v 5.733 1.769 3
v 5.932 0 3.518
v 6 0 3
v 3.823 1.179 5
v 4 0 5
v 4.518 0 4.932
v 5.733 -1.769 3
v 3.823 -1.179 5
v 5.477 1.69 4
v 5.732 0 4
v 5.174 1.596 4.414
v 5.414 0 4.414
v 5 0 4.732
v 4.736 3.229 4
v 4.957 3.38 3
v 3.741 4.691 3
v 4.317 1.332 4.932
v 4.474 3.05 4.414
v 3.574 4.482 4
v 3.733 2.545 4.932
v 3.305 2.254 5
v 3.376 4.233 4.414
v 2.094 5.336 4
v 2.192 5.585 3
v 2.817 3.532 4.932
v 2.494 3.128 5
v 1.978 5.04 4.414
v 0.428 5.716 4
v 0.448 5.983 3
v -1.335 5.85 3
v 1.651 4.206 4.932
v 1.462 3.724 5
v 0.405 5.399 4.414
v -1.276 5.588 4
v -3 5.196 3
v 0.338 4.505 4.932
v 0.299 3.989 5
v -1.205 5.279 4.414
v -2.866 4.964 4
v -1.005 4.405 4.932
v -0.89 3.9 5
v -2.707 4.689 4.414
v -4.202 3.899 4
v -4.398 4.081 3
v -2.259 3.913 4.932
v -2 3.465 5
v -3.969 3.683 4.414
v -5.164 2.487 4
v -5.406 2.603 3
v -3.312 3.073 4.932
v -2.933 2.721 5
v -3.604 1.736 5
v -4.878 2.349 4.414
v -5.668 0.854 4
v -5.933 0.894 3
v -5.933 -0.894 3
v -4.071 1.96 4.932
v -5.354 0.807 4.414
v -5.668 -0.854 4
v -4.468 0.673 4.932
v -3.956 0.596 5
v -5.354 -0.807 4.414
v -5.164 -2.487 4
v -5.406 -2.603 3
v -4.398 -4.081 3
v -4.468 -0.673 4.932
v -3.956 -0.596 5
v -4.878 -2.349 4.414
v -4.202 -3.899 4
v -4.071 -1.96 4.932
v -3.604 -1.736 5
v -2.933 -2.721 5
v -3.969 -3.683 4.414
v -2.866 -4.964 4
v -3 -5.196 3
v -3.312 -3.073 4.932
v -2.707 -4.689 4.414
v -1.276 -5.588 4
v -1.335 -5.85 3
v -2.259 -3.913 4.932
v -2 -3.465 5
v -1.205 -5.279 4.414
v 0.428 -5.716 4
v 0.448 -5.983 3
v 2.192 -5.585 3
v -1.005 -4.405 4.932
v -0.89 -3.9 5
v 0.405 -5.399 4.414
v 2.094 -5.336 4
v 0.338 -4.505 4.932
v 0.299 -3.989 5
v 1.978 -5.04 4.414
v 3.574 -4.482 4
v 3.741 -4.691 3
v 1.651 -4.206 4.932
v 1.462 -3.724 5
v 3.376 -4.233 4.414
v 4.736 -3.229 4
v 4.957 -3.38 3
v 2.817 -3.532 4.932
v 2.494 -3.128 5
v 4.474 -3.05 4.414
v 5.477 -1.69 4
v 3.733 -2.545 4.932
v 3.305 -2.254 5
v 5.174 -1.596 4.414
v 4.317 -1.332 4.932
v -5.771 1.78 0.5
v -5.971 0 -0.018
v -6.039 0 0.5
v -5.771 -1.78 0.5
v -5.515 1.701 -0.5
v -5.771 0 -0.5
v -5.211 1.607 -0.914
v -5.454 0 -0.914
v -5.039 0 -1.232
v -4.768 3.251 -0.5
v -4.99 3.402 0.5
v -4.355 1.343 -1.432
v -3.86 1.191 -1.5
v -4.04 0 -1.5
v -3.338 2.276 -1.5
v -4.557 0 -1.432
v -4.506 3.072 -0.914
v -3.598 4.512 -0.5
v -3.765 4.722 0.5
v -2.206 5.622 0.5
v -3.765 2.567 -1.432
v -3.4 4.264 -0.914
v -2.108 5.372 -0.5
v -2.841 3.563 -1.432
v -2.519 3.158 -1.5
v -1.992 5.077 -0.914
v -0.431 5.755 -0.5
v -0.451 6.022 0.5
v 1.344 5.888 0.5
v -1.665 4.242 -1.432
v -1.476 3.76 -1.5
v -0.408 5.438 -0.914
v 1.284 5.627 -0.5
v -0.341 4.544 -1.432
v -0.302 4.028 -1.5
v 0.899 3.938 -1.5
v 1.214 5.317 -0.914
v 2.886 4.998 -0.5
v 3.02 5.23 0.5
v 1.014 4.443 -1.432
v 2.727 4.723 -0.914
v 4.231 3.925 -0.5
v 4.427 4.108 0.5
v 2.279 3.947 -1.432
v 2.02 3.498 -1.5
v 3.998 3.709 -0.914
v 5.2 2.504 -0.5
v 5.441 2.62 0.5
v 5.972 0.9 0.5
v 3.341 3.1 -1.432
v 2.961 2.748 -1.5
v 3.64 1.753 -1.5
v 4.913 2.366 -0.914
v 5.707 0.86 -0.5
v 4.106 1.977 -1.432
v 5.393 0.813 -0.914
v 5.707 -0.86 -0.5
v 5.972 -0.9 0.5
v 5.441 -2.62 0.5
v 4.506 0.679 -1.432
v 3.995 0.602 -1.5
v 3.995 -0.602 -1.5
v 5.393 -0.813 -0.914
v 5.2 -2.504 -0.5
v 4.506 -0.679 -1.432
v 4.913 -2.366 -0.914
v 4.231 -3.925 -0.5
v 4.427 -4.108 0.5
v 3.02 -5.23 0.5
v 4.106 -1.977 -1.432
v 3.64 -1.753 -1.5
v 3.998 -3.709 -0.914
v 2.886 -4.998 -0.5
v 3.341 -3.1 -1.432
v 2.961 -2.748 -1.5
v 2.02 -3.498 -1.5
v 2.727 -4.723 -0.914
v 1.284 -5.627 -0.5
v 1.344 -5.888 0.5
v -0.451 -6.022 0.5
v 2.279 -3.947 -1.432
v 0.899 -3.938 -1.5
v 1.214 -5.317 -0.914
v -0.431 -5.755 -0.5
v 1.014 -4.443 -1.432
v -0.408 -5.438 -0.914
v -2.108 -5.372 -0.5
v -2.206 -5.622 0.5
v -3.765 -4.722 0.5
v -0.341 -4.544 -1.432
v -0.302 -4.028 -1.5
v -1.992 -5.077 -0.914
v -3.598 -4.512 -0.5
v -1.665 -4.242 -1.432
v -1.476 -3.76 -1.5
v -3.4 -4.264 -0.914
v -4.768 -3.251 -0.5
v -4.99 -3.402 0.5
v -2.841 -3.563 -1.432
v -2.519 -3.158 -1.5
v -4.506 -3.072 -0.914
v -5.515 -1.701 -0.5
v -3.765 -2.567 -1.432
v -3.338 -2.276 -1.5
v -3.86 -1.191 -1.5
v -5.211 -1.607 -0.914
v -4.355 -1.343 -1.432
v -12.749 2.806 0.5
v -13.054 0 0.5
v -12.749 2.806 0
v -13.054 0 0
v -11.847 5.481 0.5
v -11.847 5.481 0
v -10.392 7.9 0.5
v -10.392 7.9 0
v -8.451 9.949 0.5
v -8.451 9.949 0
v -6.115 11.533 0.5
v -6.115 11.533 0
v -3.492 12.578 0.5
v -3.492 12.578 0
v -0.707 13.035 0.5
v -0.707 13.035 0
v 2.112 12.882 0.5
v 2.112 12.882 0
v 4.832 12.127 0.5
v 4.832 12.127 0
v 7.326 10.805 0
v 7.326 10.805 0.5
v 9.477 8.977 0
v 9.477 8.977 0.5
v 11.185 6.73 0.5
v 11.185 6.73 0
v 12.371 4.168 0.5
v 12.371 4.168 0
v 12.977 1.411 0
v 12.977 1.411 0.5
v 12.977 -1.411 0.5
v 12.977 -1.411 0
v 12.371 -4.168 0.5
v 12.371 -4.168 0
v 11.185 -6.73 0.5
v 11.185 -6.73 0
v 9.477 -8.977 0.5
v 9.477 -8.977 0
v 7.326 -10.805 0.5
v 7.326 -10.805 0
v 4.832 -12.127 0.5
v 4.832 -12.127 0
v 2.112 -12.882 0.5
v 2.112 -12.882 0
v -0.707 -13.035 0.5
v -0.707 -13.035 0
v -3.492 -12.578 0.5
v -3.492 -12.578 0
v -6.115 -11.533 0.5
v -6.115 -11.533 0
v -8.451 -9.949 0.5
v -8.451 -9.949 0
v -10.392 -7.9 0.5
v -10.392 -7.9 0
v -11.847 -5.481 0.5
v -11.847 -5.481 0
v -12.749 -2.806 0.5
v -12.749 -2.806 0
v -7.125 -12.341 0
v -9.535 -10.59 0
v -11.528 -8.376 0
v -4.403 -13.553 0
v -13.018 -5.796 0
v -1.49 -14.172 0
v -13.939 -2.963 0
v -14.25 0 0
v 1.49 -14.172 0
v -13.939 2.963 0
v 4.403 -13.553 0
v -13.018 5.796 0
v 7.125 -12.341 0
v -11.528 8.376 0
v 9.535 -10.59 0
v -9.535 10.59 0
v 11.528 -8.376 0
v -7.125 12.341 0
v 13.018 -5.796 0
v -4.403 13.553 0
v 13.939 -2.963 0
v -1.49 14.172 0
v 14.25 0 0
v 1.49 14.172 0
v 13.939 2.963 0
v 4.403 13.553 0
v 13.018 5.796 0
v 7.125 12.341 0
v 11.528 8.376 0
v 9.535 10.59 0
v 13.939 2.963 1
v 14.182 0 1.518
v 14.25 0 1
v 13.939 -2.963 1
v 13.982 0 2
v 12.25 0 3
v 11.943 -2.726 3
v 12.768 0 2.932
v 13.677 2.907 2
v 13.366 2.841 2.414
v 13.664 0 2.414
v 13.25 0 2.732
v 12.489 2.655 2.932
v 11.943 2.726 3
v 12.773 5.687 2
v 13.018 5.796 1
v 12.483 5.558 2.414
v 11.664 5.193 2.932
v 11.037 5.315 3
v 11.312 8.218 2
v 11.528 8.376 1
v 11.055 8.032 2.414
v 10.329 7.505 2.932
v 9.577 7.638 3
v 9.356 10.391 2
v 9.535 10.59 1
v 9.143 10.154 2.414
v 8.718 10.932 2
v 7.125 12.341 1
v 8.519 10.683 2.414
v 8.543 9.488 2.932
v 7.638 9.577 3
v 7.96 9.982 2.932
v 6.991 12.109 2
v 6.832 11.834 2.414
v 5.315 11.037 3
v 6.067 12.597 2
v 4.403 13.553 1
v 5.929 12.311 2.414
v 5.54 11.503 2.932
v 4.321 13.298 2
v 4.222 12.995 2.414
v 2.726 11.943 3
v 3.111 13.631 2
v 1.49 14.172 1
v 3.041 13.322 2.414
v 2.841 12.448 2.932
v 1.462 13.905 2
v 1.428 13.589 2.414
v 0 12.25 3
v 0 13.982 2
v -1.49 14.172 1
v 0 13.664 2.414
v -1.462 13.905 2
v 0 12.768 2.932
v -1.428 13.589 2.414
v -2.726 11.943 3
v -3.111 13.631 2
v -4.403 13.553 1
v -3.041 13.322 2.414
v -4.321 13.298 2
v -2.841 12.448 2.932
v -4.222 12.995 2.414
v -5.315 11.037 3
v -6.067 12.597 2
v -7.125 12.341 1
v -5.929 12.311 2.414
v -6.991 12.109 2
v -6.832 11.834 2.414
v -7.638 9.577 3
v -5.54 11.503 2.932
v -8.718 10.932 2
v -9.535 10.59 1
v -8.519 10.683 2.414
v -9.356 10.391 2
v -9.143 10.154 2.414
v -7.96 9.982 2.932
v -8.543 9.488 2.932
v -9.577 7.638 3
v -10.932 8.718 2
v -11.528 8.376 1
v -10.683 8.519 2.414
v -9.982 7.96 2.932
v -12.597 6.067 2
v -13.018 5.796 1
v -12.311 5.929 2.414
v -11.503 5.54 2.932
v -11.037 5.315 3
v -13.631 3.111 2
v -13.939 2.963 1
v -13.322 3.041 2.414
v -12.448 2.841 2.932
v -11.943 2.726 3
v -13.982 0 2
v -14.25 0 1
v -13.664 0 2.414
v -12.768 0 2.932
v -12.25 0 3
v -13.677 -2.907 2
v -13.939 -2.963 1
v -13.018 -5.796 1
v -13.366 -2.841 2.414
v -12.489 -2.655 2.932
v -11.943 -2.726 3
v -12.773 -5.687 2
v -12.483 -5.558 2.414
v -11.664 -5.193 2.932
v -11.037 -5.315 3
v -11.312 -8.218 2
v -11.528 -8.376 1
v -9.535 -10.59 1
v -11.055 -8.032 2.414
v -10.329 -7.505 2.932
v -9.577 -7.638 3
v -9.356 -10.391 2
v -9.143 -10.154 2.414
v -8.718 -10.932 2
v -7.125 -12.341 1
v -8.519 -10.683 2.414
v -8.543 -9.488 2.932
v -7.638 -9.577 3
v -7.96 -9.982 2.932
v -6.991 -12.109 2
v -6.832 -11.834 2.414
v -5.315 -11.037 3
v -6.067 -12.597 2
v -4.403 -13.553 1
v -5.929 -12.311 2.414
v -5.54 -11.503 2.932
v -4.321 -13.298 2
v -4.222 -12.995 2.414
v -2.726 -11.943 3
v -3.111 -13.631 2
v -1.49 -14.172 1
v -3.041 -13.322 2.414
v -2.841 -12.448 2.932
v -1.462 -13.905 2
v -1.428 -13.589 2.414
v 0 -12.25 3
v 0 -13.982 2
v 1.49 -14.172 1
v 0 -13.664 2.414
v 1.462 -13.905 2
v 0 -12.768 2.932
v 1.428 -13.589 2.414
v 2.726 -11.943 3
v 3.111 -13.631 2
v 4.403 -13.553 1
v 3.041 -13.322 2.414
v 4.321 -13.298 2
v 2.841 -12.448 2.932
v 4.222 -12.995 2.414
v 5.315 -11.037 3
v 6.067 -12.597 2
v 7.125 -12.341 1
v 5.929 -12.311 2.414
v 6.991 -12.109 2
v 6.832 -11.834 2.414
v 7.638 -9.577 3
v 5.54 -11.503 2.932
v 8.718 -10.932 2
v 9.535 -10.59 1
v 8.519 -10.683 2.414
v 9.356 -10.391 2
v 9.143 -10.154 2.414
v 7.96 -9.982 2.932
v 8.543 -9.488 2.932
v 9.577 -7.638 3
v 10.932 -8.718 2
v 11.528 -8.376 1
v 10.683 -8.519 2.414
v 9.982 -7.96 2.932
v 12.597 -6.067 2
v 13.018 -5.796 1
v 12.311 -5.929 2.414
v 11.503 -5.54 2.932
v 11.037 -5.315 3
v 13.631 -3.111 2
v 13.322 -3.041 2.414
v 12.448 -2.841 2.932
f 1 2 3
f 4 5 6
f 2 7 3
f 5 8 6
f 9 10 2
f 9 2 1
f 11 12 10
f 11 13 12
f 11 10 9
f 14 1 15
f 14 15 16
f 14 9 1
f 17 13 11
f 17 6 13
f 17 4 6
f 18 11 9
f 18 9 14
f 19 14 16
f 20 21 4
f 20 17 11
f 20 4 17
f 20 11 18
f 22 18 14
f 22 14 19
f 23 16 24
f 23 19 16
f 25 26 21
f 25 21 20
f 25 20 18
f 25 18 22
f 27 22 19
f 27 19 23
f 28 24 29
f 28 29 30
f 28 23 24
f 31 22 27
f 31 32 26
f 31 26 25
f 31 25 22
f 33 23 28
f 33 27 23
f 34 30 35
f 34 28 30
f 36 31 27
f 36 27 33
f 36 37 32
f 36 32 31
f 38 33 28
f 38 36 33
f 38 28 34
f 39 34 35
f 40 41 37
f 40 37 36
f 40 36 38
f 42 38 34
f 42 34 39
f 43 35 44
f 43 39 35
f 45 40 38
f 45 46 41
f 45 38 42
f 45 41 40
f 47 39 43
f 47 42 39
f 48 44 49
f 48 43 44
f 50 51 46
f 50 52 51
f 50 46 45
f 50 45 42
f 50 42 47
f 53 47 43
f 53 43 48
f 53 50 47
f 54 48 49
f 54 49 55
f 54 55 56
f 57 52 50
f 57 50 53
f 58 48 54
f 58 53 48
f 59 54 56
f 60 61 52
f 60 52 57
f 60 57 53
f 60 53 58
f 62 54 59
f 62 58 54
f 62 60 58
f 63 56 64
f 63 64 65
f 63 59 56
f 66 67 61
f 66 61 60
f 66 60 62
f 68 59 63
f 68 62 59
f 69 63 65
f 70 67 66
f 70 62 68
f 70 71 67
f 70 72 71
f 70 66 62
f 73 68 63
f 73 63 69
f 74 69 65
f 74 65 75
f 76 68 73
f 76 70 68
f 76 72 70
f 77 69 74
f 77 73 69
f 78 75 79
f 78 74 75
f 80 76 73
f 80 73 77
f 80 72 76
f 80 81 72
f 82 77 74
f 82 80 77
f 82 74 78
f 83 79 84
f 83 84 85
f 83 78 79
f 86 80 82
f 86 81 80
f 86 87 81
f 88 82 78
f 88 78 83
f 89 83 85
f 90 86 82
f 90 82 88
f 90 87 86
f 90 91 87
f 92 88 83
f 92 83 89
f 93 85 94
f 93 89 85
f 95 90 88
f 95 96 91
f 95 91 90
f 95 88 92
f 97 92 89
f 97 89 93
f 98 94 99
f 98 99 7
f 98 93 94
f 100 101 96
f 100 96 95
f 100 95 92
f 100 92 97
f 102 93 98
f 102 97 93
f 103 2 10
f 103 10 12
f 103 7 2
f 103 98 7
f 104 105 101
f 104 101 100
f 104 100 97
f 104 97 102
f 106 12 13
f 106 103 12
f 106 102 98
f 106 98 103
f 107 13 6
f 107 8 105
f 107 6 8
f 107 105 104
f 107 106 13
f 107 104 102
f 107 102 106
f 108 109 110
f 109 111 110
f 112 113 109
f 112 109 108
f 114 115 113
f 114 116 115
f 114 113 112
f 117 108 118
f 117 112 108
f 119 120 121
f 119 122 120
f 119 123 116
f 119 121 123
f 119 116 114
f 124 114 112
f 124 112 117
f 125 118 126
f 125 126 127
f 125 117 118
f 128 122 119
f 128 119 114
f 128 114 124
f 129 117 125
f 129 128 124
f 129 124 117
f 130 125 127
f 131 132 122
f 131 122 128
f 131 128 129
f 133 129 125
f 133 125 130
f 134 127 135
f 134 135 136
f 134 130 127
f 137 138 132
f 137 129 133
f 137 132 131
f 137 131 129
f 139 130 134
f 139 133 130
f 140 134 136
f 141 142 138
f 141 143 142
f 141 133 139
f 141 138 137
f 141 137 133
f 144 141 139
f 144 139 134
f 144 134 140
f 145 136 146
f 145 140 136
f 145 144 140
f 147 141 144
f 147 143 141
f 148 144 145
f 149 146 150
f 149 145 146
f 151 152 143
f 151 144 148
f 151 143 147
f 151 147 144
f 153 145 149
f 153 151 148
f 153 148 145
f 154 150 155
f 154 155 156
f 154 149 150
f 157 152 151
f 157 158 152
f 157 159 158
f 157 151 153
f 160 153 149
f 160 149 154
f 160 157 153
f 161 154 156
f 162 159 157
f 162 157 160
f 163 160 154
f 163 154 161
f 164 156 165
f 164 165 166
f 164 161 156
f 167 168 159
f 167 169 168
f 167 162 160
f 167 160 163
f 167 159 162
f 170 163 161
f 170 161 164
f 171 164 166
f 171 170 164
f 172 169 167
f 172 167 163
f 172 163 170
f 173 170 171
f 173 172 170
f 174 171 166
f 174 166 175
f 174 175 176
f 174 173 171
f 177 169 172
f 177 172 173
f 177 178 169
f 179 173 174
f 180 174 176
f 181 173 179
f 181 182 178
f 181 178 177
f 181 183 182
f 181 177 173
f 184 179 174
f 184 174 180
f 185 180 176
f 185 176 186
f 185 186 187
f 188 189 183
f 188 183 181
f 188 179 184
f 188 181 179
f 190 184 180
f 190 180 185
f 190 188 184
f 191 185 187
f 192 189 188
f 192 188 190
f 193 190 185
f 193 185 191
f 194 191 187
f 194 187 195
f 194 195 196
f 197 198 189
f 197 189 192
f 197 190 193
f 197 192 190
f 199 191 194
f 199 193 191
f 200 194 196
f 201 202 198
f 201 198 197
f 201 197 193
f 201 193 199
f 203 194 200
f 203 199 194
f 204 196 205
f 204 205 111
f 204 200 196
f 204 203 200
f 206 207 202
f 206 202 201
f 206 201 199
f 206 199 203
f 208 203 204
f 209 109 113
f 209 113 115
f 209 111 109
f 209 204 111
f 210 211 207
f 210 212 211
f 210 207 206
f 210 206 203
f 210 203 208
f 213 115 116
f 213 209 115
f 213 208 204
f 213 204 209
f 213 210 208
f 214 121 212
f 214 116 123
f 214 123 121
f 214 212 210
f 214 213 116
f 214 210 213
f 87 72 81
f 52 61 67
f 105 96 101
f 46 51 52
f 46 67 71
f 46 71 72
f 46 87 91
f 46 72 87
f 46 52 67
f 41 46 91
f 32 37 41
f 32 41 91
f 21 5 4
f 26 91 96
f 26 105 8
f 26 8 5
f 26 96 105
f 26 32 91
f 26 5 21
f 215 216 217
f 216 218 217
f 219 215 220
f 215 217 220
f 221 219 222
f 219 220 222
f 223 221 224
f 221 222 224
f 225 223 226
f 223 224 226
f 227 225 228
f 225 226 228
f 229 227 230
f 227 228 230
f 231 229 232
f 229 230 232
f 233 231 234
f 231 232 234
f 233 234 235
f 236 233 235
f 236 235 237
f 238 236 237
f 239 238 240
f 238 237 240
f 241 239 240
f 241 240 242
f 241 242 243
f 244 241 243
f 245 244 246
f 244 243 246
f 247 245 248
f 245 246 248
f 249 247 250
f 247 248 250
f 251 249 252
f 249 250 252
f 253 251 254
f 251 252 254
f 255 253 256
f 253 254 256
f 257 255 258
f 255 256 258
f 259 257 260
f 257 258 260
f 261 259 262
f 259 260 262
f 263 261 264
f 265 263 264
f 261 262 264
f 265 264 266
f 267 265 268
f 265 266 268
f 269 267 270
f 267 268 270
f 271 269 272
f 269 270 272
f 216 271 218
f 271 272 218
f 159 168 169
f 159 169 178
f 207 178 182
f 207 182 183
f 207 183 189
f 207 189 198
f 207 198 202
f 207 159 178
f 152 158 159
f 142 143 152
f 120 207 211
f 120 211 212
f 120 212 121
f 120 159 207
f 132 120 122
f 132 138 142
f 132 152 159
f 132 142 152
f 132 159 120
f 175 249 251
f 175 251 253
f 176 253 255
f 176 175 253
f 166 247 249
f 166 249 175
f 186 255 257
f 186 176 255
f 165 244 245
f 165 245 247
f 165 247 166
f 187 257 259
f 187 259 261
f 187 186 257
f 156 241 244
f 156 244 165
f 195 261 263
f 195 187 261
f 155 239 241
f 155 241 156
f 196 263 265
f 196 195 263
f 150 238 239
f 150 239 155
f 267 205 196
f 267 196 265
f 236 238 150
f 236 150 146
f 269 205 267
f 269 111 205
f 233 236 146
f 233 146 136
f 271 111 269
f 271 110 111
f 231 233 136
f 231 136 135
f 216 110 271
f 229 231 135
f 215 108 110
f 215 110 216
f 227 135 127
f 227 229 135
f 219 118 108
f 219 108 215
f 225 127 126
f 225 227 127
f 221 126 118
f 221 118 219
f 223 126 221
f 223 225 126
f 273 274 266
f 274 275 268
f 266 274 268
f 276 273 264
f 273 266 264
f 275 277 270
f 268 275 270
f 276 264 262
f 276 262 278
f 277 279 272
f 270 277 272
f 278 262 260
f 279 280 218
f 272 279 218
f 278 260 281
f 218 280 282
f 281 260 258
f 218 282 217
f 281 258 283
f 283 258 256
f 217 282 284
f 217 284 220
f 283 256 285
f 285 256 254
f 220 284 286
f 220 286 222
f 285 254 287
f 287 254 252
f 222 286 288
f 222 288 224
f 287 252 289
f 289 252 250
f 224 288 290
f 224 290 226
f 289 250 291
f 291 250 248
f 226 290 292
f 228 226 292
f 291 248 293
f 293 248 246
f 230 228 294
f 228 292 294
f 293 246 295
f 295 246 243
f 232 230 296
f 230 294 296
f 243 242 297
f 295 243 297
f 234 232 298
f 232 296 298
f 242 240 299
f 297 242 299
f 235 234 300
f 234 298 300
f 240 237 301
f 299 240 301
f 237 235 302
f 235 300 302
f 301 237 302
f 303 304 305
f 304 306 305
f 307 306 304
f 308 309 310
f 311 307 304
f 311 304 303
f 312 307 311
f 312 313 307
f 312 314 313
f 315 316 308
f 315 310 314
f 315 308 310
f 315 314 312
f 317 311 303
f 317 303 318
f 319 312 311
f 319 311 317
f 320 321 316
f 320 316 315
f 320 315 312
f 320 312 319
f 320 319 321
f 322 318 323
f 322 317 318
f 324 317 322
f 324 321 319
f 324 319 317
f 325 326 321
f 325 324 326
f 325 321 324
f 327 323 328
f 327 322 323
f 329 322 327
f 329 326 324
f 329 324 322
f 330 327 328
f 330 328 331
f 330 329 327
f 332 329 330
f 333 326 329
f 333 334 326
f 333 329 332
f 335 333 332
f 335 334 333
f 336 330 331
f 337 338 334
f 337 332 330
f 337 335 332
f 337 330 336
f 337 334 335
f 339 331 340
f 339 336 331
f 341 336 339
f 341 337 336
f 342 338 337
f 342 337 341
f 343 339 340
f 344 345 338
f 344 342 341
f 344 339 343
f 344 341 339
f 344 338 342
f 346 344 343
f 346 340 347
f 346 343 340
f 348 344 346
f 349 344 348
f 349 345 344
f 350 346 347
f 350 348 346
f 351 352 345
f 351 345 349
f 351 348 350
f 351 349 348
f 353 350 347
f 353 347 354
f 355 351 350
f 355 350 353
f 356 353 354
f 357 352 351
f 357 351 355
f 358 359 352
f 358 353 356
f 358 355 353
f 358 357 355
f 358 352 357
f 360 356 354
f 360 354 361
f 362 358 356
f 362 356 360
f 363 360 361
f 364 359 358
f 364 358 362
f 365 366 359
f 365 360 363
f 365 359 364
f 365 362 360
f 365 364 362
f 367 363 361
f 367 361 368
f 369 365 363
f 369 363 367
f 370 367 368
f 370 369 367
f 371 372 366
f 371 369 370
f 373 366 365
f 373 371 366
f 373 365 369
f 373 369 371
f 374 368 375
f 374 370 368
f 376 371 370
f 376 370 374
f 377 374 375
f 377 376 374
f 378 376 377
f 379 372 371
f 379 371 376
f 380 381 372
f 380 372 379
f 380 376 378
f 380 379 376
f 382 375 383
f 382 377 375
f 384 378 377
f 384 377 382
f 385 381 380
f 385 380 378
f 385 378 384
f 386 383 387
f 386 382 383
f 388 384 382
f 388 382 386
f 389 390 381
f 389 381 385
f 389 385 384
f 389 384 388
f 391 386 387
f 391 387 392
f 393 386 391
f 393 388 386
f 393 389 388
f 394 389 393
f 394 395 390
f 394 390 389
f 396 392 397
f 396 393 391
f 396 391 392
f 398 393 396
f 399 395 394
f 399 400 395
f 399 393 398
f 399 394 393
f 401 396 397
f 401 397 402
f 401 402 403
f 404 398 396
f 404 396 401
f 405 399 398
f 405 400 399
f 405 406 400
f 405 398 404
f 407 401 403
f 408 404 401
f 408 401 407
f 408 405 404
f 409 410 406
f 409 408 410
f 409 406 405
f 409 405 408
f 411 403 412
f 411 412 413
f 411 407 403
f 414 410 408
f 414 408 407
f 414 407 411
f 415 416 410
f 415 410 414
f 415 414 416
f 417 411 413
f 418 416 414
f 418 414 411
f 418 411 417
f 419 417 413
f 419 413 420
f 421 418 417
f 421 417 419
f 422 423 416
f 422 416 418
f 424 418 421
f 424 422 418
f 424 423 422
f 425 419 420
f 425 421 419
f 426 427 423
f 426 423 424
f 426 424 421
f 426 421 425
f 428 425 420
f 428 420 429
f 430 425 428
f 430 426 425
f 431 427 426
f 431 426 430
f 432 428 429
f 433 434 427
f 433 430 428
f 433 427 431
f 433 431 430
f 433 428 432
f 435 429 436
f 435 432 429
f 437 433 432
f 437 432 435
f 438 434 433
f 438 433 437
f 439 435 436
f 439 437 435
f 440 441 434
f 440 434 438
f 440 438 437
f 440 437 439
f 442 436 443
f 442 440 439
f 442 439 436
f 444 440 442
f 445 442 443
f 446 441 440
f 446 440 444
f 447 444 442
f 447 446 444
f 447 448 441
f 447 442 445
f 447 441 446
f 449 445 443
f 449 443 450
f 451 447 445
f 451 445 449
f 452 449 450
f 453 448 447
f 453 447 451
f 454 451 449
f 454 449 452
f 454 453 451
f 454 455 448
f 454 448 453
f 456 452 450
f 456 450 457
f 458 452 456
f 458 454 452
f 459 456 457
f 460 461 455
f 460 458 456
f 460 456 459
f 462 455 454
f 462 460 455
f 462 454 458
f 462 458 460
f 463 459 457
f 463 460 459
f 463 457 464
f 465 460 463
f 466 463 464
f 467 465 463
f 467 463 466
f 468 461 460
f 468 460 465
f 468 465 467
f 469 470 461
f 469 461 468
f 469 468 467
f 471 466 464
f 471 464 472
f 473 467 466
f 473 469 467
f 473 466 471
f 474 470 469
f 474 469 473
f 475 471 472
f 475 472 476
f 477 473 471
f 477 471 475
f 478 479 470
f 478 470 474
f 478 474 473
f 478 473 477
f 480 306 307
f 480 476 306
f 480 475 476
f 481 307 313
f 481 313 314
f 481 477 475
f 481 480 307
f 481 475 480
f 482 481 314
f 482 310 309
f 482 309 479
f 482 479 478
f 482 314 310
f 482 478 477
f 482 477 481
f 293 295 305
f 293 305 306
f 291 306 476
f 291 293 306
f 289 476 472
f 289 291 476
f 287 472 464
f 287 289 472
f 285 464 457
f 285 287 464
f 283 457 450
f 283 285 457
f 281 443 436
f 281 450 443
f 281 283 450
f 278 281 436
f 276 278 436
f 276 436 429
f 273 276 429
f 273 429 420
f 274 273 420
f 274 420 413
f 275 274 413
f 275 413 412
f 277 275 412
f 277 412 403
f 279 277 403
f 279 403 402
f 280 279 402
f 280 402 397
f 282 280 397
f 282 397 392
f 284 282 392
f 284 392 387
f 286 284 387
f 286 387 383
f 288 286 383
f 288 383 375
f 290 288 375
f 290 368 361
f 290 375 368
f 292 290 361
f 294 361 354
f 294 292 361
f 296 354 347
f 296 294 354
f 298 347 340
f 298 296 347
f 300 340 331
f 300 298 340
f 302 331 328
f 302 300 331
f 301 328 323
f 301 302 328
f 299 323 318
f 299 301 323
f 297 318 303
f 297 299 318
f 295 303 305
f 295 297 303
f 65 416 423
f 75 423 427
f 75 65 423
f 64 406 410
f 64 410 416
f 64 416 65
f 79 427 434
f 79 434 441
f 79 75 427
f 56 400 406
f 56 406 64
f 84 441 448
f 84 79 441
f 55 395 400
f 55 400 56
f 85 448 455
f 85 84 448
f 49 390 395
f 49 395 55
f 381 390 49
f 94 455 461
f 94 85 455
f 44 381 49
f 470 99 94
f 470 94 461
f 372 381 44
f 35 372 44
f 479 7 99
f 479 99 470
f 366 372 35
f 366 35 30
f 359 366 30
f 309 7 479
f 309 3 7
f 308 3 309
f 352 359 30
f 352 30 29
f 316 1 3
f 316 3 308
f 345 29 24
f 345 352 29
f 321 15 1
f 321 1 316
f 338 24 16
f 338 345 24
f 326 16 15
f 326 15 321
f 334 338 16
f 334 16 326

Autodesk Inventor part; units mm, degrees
ref_plane "YZ Plane" through (0, 0, 0) normal (1, 0, 0) x (0, 1, 0)
ref_plane "XZ Plane" through (0, 0, 0) normal (0, 1, 0) x (-1, 0, 0)
ref_plane "XY Plane" through (0, 0, 0) normal (0, 0, 1) x (1, 0, 0)
sketch "Sketch1" plane through (0, 0, 0) normal (0, 0, 1) x (1, 0, 0)
  circle A0 centre (0, 0) radius 14.25
  dimension "d0" = 28.5
extrude "Extrusion1" add sketch "Sketch1" along normal blind 3
sketch "Sketch2" plane through (0, 0, 3) normal (0, 0, 1) x (1, 0, 0)
  circle A0 centre (0, 0) radius 6
  dimension "d3" = 12
extrude "Extrusion2" add sketch "Sketch2" along normal blind 2
fillet "Fillet1" radius 2 1 edges at (-14.25, 0, 3)
fillet "Fillet2" radius 2 1 edges at (-6, 0, 5)
sketch "Sketch3" plane through (0, 0, 0) normal (0, 0, -1) x (-1, 0, 0)
  circle A0 centre (0, 0) radius 13.0539
extrude "Extrusion3" cut sketch "Sketch3" against normal blind 0.5
sketch "Sketch4" plane through (0, 0, 0.5) normal (0, 0, -1) x (-1, 0, 0)
  circle A0 centre (0, 0) radius 6.0392
extrude "Extrusion4" add sketch "Sketch4" along normal blind 2
fillet "Fillet3" radius 2 1 edges at (6.0392, 0, -1.5)
properties part number "speaker"
